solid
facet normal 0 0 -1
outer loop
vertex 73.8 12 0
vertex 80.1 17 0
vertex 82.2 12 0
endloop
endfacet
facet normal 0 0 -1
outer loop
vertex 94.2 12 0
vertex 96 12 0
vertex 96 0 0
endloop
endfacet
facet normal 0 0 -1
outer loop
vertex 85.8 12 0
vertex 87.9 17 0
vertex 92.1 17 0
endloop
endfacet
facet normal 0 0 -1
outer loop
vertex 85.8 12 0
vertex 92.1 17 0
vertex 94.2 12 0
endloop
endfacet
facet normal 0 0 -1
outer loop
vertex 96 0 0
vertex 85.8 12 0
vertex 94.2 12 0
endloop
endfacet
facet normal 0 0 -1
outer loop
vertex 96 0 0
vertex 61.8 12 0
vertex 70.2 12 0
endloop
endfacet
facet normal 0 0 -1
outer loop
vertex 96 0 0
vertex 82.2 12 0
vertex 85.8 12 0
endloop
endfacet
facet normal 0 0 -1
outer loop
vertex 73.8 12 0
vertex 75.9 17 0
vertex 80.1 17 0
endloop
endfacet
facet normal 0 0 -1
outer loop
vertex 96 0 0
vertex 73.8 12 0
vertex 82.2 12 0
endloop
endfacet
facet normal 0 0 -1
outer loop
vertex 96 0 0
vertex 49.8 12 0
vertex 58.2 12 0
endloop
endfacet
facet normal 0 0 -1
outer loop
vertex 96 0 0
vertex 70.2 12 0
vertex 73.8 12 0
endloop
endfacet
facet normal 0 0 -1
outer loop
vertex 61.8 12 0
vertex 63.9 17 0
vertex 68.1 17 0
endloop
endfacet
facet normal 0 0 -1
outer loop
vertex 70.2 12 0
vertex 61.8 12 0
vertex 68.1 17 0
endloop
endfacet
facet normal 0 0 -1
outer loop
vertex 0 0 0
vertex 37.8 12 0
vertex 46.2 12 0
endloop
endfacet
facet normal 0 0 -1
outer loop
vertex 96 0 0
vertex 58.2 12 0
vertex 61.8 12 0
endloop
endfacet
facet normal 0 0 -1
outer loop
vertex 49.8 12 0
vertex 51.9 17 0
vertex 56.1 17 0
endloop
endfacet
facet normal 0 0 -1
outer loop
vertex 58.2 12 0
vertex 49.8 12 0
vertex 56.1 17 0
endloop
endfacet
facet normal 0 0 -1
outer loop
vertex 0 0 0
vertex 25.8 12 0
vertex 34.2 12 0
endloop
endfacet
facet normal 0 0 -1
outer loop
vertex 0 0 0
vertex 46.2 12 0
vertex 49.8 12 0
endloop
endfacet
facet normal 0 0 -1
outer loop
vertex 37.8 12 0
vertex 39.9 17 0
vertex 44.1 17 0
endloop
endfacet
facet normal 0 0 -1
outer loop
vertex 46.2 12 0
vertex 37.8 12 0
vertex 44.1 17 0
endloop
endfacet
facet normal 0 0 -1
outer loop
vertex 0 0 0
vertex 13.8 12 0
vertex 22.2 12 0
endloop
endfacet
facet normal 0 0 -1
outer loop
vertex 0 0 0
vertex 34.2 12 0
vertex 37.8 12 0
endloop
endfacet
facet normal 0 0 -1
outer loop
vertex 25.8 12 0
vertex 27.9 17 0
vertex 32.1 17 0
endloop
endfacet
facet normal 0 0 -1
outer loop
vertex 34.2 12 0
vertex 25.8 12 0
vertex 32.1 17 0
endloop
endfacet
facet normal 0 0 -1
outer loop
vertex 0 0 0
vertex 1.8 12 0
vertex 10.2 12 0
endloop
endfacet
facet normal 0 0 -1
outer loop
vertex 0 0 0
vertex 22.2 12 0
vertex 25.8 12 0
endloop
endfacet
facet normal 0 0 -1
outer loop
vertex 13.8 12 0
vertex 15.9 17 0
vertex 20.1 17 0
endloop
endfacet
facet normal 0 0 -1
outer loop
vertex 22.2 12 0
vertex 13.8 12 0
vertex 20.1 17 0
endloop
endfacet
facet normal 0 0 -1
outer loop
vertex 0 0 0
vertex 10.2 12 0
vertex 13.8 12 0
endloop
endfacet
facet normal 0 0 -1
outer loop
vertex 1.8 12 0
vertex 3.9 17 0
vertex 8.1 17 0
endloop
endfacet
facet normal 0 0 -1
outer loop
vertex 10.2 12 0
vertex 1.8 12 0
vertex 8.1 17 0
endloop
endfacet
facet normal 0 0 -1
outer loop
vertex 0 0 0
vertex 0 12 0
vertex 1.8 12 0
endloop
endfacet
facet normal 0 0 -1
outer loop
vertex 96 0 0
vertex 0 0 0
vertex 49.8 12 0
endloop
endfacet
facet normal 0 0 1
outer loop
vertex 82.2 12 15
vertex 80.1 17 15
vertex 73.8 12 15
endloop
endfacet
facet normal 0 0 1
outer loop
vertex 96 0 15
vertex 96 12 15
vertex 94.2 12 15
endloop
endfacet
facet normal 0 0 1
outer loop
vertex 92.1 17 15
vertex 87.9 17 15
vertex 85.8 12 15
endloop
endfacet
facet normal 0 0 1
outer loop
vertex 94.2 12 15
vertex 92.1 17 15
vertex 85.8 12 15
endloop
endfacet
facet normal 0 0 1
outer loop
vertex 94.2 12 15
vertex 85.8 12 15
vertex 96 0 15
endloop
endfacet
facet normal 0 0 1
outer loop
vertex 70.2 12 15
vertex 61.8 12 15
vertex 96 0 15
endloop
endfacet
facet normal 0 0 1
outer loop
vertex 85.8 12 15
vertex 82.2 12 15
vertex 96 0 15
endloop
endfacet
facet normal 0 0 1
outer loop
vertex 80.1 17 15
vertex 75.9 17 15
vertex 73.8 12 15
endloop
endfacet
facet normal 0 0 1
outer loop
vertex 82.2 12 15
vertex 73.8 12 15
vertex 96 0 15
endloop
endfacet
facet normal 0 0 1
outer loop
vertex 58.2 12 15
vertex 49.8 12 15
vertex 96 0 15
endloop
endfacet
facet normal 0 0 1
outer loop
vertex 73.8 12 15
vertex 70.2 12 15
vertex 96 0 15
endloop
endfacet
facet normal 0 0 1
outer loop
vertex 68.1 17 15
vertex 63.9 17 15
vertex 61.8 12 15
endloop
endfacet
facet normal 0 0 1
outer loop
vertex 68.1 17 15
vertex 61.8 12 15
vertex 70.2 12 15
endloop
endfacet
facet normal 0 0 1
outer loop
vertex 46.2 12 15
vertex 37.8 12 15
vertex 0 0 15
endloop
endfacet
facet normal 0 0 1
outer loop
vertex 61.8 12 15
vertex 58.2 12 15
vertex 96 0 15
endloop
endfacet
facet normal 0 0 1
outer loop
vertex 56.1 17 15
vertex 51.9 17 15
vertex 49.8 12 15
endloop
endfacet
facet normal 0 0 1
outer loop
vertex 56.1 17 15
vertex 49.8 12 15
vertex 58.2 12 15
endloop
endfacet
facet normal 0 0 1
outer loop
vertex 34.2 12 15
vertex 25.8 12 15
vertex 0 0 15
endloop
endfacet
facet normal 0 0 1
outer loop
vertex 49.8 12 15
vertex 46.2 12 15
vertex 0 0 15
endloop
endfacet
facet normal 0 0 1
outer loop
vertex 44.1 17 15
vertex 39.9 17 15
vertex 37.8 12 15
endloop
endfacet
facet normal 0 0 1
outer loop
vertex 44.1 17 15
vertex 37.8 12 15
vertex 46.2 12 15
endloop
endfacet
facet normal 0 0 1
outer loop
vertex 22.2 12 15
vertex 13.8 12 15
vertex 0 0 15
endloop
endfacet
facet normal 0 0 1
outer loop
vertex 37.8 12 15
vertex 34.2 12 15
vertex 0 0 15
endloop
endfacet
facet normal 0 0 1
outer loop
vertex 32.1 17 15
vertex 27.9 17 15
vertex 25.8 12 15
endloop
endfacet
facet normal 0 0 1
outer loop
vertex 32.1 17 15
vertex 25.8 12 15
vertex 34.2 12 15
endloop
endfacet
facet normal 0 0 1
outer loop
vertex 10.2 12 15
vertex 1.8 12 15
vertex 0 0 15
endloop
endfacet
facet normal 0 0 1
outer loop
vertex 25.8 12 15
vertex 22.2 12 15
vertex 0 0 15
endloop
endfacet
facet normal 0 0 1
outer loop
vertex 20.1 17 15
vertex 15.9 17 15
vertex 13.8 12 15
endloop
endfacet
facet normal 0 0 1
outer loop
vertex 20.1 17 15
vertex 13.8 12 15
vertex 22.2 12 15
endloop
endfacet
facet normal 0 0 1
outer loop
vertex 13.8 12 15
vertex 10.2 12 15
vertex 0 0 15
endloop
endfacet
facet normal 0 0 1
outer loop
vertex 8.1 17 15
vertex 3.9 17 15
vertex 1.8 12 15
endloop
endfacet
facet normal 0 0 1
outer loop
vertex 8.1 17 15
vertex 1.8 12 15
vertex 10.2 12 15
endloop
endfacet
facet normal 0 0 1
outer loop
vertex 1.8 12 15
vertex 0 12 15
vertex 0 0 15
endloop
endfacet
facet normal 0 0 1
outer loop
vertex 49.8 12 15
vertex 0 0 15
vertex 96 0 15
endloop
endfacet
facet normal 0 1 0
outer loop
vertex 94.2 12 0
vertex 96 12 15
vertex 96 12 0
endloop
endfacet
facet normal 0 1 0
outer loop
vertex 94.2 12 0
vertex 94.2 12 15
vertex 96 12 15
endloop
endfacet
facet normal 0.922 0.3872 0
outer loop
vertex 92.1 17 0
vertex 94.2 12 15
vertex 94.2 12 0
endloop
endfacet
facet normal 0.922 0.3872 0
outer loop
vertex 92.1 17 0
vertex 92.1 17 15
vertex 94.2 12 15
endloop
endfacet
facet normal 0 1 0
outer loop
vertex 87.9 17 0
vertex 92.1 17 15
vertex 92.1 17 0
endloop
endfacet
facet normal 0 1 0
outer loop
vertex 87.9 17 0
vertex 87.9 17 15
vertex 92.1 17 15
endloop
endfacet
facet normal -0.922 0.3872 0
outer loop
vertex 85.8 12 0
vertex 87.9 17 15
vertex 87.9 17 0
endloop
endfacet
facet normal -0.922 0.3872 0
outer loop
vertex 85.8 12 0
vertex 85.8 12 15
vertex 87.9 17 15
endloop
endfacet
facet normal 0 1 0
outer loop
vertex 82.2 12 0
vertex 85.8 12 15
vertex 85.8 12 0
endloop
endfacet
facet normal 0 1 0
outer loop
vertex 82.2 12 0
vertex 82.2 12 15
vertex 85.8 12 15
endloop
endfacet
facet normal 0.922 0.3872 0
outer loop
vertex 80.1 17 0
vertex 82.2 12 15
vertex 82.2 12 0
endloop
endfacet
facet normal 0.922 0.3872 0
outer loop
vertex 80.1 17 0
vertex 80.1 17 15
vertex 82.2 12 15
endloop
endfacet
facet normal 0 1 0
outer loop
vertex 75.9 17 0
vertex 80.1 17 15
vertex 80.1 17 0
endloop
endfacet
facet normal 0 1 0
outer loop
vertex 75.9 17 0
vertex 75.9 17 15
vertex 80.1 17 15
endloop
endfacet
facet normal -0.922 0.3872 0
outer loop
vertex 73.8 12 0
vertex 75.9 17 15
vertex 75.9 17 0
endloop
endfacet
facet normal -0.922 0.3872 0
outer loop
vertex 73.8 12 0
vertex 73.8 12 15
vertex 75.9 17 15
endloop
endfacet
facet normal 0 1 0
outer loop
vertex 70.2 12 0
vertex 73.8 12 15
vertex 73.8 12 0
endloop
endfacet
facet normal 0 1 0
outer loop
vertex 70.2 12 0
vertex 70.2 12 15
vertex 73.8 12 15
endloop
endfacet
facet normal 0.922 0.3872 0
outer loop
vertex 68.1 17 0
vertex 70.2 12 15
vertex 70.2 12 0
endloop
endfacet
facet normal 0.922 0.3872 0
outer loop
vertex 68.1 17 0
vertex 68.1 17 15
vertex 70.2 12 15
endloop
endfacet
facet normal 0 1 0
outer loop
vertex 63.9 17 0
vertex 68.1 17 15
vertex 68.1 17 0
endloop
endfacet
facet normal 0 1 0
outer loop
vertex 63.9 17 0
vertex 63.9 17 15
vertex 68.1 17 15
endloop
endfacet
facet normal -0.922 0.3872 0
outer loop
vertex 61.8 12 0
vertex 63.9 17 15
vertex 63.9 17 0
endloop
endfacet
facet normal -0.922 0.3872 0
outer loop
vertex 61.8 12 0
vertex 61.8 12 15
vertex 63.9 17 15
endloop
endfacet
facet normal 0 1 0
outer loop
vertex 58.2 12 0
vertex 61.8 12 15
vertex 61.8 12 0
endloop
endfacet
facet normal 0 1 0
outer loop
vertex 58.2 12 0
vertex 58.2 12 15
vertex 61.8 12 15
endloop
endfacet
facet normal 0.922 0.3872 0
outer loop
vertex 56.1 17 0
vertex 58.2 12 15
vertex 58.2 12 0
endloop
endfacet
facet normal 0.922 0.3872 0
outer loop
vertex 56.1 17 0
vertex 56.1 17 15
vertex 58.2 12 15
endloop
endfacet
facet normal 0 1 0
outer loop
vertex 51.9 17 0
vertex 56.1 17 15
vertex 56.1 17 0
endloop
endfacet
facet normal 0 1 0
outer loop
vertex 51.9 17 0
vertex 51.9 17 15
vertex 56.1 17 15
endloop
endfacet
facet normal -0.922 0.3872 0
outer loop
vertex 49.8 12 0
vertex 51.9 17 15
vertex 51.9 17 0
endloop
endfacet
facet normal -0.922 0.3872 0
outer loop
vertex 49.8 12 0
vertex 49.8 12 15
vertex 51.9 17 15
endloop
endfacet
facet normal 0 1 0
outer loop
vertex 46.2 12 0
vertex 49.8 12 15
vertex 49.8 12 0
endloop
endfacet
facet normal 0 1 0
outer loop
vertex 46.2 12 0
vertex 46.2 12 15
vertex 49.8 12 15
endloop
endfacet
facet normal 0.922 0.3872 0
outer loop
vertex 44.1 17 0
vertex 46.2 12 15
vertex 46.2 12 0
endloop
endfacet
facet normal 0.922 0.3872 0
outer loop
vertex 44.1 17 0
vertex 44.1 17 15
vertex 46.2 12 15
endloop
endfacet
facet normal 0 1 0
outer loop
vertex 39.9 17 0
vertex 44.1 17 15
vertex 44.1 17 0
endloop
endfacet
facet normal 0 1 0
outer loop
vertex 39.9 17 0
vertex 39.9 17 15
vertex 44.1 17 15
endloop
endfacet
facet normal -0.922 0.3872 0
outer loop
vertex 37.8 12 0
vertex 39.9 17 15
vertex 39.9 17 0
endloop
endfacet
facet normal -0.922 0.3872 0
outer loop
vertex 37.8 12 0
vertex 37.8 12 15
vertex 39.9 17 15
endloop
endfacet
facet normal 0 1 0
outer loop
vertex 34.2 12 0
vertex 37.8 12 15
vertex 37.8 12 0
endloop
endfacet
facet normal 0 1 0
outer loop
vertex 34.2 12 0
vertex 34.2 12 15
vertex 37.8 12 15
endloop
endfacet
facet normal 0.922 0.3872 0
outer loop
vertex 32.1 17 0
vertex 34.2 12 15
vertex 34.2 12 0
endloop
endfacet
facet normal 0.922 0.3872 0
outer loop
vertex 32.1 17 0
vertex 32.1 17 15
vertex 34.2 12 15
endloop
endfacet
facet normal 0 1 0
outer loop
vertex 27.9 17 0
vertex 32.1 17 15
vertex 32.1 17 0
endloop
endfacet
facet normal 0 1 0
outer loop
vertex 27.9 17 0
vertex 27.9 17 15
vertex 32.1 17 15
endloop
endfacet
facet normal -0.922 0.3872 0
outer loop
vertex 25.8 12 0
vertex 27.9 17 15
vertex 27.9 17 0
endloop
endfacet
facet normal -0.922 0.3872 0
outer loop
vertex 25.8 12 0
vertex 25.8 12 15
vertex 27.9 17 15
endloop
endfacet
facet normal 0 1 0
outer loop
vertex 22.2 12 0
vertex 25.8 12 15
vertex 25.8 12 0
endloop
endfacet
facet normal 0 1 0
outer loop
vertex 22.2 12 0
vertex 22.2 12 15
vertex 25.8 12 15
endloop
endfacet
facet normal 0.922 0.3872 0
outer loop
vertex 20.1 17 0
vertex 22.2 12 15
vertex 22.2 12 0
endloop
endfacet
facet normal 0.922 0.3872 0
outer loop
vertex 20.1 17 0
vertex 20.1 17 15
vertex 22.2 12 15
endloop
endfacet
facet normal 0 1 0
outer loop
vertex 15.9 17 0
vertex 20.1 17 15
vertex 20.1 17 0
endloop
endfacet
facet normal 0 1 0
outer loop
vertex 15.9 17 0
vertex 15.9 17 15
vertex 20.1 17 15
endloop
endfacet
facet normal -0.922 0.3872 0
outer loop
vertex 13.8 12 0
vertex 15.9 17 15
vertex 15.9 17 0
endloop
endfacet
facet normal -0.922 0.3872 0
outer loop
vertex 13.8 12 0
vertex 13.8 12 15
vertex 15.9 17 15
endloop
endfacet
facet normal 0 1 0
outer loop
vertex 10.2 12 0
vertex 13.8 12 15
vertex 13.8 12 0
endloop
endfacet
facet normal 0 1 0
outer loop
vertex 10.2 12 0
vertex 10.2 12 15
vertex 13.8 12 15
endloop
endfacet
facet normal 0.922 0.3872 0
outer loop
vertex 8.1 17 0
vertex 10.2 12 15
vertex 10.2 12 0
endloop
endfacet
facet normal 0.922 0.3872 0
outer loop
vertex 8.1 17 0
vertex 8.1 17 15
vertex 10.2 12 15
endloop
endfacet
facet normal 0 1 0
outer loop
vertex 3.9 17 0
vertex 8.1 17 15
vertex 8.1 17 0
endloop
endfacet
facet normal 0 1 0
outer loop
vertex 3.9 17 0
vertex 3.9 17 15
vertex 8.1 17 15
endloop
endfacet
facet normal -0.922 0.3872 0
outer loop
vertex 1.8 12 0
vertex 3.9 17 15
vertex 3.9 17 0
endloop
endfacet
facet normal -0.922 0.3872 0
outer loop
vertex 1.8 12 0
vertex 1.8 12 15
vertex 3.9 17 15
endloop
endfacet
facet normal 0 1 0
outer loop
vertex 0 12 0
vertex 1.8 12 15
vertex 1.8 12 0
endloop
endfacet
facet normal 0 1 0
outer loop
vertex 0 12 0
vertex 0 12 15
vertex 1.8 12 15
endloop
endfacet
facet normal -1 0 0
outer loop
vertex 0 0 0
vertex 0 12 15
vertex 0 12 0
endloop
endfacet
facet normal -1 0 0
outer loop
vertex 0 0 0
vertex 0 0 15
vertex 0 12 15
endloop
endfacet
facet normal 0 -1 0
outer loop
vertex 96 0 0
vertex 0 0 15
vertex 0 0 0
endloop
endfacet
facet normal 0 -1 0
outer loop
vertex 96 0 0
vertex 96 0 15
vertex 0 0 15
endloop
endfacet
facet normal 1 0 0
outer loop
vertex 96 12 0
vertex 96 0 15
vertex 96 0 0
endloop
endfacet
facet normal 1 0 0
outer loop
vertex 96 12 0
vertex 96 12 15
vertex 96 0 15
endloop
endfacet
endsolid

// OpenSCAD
$fn = 32;

// ----------------------------------------------------------------------
// Gear rack: 8 teeth, pitch 12 mm
// ----------------------------------------------------------------------

// --- parameters (mm) ---
teeth = 8;                // number of teeth
pitch = 12;               // tooth pitch, X
root_w = 8.4;             // tooth width at the root
tip_w = 4.2;              // tooth width at the tip
base_h = 12;              // rack body height, Y
tooth_h = 5;              // tooth height above the body
plate_t = 15;             // rack width, Z (extrusion height)

rack_l = teeth * pitch;  // overall length
total_h = base_h + tooth_h;  // overall height

profile = [[0, 0], [96, 0], [96, 12], [94.2, 12], [92.1, 17], [87.9, 17], [85.8, 12], [82.2, 12], [80.1, 17], [75.9, 17], [73.8, 12], [70.2, 12], [68.1, 17], [63.9, 17], [61.8, 12], [58.2, 12], [56.1, 17], [51.9, 17], [49.8, 12], [46.2, 12], [44.1, 17], [39.9, 17], [37.8, 12], [34.2, 12], [32.1, 17], [27.9, 17], [25.8, 12], [22.2, 12], [20.1, 17], [15.9, 17], [13.8, 12], [10.2, 12], [8.1, 17], [3.9, 17], [1.8, 12], [0, 12]];  // primary outline, 36 points, counter clockwise

// --- the one profile operation ---
linear_extrude(height = plate_t) polygon(points = profile);
